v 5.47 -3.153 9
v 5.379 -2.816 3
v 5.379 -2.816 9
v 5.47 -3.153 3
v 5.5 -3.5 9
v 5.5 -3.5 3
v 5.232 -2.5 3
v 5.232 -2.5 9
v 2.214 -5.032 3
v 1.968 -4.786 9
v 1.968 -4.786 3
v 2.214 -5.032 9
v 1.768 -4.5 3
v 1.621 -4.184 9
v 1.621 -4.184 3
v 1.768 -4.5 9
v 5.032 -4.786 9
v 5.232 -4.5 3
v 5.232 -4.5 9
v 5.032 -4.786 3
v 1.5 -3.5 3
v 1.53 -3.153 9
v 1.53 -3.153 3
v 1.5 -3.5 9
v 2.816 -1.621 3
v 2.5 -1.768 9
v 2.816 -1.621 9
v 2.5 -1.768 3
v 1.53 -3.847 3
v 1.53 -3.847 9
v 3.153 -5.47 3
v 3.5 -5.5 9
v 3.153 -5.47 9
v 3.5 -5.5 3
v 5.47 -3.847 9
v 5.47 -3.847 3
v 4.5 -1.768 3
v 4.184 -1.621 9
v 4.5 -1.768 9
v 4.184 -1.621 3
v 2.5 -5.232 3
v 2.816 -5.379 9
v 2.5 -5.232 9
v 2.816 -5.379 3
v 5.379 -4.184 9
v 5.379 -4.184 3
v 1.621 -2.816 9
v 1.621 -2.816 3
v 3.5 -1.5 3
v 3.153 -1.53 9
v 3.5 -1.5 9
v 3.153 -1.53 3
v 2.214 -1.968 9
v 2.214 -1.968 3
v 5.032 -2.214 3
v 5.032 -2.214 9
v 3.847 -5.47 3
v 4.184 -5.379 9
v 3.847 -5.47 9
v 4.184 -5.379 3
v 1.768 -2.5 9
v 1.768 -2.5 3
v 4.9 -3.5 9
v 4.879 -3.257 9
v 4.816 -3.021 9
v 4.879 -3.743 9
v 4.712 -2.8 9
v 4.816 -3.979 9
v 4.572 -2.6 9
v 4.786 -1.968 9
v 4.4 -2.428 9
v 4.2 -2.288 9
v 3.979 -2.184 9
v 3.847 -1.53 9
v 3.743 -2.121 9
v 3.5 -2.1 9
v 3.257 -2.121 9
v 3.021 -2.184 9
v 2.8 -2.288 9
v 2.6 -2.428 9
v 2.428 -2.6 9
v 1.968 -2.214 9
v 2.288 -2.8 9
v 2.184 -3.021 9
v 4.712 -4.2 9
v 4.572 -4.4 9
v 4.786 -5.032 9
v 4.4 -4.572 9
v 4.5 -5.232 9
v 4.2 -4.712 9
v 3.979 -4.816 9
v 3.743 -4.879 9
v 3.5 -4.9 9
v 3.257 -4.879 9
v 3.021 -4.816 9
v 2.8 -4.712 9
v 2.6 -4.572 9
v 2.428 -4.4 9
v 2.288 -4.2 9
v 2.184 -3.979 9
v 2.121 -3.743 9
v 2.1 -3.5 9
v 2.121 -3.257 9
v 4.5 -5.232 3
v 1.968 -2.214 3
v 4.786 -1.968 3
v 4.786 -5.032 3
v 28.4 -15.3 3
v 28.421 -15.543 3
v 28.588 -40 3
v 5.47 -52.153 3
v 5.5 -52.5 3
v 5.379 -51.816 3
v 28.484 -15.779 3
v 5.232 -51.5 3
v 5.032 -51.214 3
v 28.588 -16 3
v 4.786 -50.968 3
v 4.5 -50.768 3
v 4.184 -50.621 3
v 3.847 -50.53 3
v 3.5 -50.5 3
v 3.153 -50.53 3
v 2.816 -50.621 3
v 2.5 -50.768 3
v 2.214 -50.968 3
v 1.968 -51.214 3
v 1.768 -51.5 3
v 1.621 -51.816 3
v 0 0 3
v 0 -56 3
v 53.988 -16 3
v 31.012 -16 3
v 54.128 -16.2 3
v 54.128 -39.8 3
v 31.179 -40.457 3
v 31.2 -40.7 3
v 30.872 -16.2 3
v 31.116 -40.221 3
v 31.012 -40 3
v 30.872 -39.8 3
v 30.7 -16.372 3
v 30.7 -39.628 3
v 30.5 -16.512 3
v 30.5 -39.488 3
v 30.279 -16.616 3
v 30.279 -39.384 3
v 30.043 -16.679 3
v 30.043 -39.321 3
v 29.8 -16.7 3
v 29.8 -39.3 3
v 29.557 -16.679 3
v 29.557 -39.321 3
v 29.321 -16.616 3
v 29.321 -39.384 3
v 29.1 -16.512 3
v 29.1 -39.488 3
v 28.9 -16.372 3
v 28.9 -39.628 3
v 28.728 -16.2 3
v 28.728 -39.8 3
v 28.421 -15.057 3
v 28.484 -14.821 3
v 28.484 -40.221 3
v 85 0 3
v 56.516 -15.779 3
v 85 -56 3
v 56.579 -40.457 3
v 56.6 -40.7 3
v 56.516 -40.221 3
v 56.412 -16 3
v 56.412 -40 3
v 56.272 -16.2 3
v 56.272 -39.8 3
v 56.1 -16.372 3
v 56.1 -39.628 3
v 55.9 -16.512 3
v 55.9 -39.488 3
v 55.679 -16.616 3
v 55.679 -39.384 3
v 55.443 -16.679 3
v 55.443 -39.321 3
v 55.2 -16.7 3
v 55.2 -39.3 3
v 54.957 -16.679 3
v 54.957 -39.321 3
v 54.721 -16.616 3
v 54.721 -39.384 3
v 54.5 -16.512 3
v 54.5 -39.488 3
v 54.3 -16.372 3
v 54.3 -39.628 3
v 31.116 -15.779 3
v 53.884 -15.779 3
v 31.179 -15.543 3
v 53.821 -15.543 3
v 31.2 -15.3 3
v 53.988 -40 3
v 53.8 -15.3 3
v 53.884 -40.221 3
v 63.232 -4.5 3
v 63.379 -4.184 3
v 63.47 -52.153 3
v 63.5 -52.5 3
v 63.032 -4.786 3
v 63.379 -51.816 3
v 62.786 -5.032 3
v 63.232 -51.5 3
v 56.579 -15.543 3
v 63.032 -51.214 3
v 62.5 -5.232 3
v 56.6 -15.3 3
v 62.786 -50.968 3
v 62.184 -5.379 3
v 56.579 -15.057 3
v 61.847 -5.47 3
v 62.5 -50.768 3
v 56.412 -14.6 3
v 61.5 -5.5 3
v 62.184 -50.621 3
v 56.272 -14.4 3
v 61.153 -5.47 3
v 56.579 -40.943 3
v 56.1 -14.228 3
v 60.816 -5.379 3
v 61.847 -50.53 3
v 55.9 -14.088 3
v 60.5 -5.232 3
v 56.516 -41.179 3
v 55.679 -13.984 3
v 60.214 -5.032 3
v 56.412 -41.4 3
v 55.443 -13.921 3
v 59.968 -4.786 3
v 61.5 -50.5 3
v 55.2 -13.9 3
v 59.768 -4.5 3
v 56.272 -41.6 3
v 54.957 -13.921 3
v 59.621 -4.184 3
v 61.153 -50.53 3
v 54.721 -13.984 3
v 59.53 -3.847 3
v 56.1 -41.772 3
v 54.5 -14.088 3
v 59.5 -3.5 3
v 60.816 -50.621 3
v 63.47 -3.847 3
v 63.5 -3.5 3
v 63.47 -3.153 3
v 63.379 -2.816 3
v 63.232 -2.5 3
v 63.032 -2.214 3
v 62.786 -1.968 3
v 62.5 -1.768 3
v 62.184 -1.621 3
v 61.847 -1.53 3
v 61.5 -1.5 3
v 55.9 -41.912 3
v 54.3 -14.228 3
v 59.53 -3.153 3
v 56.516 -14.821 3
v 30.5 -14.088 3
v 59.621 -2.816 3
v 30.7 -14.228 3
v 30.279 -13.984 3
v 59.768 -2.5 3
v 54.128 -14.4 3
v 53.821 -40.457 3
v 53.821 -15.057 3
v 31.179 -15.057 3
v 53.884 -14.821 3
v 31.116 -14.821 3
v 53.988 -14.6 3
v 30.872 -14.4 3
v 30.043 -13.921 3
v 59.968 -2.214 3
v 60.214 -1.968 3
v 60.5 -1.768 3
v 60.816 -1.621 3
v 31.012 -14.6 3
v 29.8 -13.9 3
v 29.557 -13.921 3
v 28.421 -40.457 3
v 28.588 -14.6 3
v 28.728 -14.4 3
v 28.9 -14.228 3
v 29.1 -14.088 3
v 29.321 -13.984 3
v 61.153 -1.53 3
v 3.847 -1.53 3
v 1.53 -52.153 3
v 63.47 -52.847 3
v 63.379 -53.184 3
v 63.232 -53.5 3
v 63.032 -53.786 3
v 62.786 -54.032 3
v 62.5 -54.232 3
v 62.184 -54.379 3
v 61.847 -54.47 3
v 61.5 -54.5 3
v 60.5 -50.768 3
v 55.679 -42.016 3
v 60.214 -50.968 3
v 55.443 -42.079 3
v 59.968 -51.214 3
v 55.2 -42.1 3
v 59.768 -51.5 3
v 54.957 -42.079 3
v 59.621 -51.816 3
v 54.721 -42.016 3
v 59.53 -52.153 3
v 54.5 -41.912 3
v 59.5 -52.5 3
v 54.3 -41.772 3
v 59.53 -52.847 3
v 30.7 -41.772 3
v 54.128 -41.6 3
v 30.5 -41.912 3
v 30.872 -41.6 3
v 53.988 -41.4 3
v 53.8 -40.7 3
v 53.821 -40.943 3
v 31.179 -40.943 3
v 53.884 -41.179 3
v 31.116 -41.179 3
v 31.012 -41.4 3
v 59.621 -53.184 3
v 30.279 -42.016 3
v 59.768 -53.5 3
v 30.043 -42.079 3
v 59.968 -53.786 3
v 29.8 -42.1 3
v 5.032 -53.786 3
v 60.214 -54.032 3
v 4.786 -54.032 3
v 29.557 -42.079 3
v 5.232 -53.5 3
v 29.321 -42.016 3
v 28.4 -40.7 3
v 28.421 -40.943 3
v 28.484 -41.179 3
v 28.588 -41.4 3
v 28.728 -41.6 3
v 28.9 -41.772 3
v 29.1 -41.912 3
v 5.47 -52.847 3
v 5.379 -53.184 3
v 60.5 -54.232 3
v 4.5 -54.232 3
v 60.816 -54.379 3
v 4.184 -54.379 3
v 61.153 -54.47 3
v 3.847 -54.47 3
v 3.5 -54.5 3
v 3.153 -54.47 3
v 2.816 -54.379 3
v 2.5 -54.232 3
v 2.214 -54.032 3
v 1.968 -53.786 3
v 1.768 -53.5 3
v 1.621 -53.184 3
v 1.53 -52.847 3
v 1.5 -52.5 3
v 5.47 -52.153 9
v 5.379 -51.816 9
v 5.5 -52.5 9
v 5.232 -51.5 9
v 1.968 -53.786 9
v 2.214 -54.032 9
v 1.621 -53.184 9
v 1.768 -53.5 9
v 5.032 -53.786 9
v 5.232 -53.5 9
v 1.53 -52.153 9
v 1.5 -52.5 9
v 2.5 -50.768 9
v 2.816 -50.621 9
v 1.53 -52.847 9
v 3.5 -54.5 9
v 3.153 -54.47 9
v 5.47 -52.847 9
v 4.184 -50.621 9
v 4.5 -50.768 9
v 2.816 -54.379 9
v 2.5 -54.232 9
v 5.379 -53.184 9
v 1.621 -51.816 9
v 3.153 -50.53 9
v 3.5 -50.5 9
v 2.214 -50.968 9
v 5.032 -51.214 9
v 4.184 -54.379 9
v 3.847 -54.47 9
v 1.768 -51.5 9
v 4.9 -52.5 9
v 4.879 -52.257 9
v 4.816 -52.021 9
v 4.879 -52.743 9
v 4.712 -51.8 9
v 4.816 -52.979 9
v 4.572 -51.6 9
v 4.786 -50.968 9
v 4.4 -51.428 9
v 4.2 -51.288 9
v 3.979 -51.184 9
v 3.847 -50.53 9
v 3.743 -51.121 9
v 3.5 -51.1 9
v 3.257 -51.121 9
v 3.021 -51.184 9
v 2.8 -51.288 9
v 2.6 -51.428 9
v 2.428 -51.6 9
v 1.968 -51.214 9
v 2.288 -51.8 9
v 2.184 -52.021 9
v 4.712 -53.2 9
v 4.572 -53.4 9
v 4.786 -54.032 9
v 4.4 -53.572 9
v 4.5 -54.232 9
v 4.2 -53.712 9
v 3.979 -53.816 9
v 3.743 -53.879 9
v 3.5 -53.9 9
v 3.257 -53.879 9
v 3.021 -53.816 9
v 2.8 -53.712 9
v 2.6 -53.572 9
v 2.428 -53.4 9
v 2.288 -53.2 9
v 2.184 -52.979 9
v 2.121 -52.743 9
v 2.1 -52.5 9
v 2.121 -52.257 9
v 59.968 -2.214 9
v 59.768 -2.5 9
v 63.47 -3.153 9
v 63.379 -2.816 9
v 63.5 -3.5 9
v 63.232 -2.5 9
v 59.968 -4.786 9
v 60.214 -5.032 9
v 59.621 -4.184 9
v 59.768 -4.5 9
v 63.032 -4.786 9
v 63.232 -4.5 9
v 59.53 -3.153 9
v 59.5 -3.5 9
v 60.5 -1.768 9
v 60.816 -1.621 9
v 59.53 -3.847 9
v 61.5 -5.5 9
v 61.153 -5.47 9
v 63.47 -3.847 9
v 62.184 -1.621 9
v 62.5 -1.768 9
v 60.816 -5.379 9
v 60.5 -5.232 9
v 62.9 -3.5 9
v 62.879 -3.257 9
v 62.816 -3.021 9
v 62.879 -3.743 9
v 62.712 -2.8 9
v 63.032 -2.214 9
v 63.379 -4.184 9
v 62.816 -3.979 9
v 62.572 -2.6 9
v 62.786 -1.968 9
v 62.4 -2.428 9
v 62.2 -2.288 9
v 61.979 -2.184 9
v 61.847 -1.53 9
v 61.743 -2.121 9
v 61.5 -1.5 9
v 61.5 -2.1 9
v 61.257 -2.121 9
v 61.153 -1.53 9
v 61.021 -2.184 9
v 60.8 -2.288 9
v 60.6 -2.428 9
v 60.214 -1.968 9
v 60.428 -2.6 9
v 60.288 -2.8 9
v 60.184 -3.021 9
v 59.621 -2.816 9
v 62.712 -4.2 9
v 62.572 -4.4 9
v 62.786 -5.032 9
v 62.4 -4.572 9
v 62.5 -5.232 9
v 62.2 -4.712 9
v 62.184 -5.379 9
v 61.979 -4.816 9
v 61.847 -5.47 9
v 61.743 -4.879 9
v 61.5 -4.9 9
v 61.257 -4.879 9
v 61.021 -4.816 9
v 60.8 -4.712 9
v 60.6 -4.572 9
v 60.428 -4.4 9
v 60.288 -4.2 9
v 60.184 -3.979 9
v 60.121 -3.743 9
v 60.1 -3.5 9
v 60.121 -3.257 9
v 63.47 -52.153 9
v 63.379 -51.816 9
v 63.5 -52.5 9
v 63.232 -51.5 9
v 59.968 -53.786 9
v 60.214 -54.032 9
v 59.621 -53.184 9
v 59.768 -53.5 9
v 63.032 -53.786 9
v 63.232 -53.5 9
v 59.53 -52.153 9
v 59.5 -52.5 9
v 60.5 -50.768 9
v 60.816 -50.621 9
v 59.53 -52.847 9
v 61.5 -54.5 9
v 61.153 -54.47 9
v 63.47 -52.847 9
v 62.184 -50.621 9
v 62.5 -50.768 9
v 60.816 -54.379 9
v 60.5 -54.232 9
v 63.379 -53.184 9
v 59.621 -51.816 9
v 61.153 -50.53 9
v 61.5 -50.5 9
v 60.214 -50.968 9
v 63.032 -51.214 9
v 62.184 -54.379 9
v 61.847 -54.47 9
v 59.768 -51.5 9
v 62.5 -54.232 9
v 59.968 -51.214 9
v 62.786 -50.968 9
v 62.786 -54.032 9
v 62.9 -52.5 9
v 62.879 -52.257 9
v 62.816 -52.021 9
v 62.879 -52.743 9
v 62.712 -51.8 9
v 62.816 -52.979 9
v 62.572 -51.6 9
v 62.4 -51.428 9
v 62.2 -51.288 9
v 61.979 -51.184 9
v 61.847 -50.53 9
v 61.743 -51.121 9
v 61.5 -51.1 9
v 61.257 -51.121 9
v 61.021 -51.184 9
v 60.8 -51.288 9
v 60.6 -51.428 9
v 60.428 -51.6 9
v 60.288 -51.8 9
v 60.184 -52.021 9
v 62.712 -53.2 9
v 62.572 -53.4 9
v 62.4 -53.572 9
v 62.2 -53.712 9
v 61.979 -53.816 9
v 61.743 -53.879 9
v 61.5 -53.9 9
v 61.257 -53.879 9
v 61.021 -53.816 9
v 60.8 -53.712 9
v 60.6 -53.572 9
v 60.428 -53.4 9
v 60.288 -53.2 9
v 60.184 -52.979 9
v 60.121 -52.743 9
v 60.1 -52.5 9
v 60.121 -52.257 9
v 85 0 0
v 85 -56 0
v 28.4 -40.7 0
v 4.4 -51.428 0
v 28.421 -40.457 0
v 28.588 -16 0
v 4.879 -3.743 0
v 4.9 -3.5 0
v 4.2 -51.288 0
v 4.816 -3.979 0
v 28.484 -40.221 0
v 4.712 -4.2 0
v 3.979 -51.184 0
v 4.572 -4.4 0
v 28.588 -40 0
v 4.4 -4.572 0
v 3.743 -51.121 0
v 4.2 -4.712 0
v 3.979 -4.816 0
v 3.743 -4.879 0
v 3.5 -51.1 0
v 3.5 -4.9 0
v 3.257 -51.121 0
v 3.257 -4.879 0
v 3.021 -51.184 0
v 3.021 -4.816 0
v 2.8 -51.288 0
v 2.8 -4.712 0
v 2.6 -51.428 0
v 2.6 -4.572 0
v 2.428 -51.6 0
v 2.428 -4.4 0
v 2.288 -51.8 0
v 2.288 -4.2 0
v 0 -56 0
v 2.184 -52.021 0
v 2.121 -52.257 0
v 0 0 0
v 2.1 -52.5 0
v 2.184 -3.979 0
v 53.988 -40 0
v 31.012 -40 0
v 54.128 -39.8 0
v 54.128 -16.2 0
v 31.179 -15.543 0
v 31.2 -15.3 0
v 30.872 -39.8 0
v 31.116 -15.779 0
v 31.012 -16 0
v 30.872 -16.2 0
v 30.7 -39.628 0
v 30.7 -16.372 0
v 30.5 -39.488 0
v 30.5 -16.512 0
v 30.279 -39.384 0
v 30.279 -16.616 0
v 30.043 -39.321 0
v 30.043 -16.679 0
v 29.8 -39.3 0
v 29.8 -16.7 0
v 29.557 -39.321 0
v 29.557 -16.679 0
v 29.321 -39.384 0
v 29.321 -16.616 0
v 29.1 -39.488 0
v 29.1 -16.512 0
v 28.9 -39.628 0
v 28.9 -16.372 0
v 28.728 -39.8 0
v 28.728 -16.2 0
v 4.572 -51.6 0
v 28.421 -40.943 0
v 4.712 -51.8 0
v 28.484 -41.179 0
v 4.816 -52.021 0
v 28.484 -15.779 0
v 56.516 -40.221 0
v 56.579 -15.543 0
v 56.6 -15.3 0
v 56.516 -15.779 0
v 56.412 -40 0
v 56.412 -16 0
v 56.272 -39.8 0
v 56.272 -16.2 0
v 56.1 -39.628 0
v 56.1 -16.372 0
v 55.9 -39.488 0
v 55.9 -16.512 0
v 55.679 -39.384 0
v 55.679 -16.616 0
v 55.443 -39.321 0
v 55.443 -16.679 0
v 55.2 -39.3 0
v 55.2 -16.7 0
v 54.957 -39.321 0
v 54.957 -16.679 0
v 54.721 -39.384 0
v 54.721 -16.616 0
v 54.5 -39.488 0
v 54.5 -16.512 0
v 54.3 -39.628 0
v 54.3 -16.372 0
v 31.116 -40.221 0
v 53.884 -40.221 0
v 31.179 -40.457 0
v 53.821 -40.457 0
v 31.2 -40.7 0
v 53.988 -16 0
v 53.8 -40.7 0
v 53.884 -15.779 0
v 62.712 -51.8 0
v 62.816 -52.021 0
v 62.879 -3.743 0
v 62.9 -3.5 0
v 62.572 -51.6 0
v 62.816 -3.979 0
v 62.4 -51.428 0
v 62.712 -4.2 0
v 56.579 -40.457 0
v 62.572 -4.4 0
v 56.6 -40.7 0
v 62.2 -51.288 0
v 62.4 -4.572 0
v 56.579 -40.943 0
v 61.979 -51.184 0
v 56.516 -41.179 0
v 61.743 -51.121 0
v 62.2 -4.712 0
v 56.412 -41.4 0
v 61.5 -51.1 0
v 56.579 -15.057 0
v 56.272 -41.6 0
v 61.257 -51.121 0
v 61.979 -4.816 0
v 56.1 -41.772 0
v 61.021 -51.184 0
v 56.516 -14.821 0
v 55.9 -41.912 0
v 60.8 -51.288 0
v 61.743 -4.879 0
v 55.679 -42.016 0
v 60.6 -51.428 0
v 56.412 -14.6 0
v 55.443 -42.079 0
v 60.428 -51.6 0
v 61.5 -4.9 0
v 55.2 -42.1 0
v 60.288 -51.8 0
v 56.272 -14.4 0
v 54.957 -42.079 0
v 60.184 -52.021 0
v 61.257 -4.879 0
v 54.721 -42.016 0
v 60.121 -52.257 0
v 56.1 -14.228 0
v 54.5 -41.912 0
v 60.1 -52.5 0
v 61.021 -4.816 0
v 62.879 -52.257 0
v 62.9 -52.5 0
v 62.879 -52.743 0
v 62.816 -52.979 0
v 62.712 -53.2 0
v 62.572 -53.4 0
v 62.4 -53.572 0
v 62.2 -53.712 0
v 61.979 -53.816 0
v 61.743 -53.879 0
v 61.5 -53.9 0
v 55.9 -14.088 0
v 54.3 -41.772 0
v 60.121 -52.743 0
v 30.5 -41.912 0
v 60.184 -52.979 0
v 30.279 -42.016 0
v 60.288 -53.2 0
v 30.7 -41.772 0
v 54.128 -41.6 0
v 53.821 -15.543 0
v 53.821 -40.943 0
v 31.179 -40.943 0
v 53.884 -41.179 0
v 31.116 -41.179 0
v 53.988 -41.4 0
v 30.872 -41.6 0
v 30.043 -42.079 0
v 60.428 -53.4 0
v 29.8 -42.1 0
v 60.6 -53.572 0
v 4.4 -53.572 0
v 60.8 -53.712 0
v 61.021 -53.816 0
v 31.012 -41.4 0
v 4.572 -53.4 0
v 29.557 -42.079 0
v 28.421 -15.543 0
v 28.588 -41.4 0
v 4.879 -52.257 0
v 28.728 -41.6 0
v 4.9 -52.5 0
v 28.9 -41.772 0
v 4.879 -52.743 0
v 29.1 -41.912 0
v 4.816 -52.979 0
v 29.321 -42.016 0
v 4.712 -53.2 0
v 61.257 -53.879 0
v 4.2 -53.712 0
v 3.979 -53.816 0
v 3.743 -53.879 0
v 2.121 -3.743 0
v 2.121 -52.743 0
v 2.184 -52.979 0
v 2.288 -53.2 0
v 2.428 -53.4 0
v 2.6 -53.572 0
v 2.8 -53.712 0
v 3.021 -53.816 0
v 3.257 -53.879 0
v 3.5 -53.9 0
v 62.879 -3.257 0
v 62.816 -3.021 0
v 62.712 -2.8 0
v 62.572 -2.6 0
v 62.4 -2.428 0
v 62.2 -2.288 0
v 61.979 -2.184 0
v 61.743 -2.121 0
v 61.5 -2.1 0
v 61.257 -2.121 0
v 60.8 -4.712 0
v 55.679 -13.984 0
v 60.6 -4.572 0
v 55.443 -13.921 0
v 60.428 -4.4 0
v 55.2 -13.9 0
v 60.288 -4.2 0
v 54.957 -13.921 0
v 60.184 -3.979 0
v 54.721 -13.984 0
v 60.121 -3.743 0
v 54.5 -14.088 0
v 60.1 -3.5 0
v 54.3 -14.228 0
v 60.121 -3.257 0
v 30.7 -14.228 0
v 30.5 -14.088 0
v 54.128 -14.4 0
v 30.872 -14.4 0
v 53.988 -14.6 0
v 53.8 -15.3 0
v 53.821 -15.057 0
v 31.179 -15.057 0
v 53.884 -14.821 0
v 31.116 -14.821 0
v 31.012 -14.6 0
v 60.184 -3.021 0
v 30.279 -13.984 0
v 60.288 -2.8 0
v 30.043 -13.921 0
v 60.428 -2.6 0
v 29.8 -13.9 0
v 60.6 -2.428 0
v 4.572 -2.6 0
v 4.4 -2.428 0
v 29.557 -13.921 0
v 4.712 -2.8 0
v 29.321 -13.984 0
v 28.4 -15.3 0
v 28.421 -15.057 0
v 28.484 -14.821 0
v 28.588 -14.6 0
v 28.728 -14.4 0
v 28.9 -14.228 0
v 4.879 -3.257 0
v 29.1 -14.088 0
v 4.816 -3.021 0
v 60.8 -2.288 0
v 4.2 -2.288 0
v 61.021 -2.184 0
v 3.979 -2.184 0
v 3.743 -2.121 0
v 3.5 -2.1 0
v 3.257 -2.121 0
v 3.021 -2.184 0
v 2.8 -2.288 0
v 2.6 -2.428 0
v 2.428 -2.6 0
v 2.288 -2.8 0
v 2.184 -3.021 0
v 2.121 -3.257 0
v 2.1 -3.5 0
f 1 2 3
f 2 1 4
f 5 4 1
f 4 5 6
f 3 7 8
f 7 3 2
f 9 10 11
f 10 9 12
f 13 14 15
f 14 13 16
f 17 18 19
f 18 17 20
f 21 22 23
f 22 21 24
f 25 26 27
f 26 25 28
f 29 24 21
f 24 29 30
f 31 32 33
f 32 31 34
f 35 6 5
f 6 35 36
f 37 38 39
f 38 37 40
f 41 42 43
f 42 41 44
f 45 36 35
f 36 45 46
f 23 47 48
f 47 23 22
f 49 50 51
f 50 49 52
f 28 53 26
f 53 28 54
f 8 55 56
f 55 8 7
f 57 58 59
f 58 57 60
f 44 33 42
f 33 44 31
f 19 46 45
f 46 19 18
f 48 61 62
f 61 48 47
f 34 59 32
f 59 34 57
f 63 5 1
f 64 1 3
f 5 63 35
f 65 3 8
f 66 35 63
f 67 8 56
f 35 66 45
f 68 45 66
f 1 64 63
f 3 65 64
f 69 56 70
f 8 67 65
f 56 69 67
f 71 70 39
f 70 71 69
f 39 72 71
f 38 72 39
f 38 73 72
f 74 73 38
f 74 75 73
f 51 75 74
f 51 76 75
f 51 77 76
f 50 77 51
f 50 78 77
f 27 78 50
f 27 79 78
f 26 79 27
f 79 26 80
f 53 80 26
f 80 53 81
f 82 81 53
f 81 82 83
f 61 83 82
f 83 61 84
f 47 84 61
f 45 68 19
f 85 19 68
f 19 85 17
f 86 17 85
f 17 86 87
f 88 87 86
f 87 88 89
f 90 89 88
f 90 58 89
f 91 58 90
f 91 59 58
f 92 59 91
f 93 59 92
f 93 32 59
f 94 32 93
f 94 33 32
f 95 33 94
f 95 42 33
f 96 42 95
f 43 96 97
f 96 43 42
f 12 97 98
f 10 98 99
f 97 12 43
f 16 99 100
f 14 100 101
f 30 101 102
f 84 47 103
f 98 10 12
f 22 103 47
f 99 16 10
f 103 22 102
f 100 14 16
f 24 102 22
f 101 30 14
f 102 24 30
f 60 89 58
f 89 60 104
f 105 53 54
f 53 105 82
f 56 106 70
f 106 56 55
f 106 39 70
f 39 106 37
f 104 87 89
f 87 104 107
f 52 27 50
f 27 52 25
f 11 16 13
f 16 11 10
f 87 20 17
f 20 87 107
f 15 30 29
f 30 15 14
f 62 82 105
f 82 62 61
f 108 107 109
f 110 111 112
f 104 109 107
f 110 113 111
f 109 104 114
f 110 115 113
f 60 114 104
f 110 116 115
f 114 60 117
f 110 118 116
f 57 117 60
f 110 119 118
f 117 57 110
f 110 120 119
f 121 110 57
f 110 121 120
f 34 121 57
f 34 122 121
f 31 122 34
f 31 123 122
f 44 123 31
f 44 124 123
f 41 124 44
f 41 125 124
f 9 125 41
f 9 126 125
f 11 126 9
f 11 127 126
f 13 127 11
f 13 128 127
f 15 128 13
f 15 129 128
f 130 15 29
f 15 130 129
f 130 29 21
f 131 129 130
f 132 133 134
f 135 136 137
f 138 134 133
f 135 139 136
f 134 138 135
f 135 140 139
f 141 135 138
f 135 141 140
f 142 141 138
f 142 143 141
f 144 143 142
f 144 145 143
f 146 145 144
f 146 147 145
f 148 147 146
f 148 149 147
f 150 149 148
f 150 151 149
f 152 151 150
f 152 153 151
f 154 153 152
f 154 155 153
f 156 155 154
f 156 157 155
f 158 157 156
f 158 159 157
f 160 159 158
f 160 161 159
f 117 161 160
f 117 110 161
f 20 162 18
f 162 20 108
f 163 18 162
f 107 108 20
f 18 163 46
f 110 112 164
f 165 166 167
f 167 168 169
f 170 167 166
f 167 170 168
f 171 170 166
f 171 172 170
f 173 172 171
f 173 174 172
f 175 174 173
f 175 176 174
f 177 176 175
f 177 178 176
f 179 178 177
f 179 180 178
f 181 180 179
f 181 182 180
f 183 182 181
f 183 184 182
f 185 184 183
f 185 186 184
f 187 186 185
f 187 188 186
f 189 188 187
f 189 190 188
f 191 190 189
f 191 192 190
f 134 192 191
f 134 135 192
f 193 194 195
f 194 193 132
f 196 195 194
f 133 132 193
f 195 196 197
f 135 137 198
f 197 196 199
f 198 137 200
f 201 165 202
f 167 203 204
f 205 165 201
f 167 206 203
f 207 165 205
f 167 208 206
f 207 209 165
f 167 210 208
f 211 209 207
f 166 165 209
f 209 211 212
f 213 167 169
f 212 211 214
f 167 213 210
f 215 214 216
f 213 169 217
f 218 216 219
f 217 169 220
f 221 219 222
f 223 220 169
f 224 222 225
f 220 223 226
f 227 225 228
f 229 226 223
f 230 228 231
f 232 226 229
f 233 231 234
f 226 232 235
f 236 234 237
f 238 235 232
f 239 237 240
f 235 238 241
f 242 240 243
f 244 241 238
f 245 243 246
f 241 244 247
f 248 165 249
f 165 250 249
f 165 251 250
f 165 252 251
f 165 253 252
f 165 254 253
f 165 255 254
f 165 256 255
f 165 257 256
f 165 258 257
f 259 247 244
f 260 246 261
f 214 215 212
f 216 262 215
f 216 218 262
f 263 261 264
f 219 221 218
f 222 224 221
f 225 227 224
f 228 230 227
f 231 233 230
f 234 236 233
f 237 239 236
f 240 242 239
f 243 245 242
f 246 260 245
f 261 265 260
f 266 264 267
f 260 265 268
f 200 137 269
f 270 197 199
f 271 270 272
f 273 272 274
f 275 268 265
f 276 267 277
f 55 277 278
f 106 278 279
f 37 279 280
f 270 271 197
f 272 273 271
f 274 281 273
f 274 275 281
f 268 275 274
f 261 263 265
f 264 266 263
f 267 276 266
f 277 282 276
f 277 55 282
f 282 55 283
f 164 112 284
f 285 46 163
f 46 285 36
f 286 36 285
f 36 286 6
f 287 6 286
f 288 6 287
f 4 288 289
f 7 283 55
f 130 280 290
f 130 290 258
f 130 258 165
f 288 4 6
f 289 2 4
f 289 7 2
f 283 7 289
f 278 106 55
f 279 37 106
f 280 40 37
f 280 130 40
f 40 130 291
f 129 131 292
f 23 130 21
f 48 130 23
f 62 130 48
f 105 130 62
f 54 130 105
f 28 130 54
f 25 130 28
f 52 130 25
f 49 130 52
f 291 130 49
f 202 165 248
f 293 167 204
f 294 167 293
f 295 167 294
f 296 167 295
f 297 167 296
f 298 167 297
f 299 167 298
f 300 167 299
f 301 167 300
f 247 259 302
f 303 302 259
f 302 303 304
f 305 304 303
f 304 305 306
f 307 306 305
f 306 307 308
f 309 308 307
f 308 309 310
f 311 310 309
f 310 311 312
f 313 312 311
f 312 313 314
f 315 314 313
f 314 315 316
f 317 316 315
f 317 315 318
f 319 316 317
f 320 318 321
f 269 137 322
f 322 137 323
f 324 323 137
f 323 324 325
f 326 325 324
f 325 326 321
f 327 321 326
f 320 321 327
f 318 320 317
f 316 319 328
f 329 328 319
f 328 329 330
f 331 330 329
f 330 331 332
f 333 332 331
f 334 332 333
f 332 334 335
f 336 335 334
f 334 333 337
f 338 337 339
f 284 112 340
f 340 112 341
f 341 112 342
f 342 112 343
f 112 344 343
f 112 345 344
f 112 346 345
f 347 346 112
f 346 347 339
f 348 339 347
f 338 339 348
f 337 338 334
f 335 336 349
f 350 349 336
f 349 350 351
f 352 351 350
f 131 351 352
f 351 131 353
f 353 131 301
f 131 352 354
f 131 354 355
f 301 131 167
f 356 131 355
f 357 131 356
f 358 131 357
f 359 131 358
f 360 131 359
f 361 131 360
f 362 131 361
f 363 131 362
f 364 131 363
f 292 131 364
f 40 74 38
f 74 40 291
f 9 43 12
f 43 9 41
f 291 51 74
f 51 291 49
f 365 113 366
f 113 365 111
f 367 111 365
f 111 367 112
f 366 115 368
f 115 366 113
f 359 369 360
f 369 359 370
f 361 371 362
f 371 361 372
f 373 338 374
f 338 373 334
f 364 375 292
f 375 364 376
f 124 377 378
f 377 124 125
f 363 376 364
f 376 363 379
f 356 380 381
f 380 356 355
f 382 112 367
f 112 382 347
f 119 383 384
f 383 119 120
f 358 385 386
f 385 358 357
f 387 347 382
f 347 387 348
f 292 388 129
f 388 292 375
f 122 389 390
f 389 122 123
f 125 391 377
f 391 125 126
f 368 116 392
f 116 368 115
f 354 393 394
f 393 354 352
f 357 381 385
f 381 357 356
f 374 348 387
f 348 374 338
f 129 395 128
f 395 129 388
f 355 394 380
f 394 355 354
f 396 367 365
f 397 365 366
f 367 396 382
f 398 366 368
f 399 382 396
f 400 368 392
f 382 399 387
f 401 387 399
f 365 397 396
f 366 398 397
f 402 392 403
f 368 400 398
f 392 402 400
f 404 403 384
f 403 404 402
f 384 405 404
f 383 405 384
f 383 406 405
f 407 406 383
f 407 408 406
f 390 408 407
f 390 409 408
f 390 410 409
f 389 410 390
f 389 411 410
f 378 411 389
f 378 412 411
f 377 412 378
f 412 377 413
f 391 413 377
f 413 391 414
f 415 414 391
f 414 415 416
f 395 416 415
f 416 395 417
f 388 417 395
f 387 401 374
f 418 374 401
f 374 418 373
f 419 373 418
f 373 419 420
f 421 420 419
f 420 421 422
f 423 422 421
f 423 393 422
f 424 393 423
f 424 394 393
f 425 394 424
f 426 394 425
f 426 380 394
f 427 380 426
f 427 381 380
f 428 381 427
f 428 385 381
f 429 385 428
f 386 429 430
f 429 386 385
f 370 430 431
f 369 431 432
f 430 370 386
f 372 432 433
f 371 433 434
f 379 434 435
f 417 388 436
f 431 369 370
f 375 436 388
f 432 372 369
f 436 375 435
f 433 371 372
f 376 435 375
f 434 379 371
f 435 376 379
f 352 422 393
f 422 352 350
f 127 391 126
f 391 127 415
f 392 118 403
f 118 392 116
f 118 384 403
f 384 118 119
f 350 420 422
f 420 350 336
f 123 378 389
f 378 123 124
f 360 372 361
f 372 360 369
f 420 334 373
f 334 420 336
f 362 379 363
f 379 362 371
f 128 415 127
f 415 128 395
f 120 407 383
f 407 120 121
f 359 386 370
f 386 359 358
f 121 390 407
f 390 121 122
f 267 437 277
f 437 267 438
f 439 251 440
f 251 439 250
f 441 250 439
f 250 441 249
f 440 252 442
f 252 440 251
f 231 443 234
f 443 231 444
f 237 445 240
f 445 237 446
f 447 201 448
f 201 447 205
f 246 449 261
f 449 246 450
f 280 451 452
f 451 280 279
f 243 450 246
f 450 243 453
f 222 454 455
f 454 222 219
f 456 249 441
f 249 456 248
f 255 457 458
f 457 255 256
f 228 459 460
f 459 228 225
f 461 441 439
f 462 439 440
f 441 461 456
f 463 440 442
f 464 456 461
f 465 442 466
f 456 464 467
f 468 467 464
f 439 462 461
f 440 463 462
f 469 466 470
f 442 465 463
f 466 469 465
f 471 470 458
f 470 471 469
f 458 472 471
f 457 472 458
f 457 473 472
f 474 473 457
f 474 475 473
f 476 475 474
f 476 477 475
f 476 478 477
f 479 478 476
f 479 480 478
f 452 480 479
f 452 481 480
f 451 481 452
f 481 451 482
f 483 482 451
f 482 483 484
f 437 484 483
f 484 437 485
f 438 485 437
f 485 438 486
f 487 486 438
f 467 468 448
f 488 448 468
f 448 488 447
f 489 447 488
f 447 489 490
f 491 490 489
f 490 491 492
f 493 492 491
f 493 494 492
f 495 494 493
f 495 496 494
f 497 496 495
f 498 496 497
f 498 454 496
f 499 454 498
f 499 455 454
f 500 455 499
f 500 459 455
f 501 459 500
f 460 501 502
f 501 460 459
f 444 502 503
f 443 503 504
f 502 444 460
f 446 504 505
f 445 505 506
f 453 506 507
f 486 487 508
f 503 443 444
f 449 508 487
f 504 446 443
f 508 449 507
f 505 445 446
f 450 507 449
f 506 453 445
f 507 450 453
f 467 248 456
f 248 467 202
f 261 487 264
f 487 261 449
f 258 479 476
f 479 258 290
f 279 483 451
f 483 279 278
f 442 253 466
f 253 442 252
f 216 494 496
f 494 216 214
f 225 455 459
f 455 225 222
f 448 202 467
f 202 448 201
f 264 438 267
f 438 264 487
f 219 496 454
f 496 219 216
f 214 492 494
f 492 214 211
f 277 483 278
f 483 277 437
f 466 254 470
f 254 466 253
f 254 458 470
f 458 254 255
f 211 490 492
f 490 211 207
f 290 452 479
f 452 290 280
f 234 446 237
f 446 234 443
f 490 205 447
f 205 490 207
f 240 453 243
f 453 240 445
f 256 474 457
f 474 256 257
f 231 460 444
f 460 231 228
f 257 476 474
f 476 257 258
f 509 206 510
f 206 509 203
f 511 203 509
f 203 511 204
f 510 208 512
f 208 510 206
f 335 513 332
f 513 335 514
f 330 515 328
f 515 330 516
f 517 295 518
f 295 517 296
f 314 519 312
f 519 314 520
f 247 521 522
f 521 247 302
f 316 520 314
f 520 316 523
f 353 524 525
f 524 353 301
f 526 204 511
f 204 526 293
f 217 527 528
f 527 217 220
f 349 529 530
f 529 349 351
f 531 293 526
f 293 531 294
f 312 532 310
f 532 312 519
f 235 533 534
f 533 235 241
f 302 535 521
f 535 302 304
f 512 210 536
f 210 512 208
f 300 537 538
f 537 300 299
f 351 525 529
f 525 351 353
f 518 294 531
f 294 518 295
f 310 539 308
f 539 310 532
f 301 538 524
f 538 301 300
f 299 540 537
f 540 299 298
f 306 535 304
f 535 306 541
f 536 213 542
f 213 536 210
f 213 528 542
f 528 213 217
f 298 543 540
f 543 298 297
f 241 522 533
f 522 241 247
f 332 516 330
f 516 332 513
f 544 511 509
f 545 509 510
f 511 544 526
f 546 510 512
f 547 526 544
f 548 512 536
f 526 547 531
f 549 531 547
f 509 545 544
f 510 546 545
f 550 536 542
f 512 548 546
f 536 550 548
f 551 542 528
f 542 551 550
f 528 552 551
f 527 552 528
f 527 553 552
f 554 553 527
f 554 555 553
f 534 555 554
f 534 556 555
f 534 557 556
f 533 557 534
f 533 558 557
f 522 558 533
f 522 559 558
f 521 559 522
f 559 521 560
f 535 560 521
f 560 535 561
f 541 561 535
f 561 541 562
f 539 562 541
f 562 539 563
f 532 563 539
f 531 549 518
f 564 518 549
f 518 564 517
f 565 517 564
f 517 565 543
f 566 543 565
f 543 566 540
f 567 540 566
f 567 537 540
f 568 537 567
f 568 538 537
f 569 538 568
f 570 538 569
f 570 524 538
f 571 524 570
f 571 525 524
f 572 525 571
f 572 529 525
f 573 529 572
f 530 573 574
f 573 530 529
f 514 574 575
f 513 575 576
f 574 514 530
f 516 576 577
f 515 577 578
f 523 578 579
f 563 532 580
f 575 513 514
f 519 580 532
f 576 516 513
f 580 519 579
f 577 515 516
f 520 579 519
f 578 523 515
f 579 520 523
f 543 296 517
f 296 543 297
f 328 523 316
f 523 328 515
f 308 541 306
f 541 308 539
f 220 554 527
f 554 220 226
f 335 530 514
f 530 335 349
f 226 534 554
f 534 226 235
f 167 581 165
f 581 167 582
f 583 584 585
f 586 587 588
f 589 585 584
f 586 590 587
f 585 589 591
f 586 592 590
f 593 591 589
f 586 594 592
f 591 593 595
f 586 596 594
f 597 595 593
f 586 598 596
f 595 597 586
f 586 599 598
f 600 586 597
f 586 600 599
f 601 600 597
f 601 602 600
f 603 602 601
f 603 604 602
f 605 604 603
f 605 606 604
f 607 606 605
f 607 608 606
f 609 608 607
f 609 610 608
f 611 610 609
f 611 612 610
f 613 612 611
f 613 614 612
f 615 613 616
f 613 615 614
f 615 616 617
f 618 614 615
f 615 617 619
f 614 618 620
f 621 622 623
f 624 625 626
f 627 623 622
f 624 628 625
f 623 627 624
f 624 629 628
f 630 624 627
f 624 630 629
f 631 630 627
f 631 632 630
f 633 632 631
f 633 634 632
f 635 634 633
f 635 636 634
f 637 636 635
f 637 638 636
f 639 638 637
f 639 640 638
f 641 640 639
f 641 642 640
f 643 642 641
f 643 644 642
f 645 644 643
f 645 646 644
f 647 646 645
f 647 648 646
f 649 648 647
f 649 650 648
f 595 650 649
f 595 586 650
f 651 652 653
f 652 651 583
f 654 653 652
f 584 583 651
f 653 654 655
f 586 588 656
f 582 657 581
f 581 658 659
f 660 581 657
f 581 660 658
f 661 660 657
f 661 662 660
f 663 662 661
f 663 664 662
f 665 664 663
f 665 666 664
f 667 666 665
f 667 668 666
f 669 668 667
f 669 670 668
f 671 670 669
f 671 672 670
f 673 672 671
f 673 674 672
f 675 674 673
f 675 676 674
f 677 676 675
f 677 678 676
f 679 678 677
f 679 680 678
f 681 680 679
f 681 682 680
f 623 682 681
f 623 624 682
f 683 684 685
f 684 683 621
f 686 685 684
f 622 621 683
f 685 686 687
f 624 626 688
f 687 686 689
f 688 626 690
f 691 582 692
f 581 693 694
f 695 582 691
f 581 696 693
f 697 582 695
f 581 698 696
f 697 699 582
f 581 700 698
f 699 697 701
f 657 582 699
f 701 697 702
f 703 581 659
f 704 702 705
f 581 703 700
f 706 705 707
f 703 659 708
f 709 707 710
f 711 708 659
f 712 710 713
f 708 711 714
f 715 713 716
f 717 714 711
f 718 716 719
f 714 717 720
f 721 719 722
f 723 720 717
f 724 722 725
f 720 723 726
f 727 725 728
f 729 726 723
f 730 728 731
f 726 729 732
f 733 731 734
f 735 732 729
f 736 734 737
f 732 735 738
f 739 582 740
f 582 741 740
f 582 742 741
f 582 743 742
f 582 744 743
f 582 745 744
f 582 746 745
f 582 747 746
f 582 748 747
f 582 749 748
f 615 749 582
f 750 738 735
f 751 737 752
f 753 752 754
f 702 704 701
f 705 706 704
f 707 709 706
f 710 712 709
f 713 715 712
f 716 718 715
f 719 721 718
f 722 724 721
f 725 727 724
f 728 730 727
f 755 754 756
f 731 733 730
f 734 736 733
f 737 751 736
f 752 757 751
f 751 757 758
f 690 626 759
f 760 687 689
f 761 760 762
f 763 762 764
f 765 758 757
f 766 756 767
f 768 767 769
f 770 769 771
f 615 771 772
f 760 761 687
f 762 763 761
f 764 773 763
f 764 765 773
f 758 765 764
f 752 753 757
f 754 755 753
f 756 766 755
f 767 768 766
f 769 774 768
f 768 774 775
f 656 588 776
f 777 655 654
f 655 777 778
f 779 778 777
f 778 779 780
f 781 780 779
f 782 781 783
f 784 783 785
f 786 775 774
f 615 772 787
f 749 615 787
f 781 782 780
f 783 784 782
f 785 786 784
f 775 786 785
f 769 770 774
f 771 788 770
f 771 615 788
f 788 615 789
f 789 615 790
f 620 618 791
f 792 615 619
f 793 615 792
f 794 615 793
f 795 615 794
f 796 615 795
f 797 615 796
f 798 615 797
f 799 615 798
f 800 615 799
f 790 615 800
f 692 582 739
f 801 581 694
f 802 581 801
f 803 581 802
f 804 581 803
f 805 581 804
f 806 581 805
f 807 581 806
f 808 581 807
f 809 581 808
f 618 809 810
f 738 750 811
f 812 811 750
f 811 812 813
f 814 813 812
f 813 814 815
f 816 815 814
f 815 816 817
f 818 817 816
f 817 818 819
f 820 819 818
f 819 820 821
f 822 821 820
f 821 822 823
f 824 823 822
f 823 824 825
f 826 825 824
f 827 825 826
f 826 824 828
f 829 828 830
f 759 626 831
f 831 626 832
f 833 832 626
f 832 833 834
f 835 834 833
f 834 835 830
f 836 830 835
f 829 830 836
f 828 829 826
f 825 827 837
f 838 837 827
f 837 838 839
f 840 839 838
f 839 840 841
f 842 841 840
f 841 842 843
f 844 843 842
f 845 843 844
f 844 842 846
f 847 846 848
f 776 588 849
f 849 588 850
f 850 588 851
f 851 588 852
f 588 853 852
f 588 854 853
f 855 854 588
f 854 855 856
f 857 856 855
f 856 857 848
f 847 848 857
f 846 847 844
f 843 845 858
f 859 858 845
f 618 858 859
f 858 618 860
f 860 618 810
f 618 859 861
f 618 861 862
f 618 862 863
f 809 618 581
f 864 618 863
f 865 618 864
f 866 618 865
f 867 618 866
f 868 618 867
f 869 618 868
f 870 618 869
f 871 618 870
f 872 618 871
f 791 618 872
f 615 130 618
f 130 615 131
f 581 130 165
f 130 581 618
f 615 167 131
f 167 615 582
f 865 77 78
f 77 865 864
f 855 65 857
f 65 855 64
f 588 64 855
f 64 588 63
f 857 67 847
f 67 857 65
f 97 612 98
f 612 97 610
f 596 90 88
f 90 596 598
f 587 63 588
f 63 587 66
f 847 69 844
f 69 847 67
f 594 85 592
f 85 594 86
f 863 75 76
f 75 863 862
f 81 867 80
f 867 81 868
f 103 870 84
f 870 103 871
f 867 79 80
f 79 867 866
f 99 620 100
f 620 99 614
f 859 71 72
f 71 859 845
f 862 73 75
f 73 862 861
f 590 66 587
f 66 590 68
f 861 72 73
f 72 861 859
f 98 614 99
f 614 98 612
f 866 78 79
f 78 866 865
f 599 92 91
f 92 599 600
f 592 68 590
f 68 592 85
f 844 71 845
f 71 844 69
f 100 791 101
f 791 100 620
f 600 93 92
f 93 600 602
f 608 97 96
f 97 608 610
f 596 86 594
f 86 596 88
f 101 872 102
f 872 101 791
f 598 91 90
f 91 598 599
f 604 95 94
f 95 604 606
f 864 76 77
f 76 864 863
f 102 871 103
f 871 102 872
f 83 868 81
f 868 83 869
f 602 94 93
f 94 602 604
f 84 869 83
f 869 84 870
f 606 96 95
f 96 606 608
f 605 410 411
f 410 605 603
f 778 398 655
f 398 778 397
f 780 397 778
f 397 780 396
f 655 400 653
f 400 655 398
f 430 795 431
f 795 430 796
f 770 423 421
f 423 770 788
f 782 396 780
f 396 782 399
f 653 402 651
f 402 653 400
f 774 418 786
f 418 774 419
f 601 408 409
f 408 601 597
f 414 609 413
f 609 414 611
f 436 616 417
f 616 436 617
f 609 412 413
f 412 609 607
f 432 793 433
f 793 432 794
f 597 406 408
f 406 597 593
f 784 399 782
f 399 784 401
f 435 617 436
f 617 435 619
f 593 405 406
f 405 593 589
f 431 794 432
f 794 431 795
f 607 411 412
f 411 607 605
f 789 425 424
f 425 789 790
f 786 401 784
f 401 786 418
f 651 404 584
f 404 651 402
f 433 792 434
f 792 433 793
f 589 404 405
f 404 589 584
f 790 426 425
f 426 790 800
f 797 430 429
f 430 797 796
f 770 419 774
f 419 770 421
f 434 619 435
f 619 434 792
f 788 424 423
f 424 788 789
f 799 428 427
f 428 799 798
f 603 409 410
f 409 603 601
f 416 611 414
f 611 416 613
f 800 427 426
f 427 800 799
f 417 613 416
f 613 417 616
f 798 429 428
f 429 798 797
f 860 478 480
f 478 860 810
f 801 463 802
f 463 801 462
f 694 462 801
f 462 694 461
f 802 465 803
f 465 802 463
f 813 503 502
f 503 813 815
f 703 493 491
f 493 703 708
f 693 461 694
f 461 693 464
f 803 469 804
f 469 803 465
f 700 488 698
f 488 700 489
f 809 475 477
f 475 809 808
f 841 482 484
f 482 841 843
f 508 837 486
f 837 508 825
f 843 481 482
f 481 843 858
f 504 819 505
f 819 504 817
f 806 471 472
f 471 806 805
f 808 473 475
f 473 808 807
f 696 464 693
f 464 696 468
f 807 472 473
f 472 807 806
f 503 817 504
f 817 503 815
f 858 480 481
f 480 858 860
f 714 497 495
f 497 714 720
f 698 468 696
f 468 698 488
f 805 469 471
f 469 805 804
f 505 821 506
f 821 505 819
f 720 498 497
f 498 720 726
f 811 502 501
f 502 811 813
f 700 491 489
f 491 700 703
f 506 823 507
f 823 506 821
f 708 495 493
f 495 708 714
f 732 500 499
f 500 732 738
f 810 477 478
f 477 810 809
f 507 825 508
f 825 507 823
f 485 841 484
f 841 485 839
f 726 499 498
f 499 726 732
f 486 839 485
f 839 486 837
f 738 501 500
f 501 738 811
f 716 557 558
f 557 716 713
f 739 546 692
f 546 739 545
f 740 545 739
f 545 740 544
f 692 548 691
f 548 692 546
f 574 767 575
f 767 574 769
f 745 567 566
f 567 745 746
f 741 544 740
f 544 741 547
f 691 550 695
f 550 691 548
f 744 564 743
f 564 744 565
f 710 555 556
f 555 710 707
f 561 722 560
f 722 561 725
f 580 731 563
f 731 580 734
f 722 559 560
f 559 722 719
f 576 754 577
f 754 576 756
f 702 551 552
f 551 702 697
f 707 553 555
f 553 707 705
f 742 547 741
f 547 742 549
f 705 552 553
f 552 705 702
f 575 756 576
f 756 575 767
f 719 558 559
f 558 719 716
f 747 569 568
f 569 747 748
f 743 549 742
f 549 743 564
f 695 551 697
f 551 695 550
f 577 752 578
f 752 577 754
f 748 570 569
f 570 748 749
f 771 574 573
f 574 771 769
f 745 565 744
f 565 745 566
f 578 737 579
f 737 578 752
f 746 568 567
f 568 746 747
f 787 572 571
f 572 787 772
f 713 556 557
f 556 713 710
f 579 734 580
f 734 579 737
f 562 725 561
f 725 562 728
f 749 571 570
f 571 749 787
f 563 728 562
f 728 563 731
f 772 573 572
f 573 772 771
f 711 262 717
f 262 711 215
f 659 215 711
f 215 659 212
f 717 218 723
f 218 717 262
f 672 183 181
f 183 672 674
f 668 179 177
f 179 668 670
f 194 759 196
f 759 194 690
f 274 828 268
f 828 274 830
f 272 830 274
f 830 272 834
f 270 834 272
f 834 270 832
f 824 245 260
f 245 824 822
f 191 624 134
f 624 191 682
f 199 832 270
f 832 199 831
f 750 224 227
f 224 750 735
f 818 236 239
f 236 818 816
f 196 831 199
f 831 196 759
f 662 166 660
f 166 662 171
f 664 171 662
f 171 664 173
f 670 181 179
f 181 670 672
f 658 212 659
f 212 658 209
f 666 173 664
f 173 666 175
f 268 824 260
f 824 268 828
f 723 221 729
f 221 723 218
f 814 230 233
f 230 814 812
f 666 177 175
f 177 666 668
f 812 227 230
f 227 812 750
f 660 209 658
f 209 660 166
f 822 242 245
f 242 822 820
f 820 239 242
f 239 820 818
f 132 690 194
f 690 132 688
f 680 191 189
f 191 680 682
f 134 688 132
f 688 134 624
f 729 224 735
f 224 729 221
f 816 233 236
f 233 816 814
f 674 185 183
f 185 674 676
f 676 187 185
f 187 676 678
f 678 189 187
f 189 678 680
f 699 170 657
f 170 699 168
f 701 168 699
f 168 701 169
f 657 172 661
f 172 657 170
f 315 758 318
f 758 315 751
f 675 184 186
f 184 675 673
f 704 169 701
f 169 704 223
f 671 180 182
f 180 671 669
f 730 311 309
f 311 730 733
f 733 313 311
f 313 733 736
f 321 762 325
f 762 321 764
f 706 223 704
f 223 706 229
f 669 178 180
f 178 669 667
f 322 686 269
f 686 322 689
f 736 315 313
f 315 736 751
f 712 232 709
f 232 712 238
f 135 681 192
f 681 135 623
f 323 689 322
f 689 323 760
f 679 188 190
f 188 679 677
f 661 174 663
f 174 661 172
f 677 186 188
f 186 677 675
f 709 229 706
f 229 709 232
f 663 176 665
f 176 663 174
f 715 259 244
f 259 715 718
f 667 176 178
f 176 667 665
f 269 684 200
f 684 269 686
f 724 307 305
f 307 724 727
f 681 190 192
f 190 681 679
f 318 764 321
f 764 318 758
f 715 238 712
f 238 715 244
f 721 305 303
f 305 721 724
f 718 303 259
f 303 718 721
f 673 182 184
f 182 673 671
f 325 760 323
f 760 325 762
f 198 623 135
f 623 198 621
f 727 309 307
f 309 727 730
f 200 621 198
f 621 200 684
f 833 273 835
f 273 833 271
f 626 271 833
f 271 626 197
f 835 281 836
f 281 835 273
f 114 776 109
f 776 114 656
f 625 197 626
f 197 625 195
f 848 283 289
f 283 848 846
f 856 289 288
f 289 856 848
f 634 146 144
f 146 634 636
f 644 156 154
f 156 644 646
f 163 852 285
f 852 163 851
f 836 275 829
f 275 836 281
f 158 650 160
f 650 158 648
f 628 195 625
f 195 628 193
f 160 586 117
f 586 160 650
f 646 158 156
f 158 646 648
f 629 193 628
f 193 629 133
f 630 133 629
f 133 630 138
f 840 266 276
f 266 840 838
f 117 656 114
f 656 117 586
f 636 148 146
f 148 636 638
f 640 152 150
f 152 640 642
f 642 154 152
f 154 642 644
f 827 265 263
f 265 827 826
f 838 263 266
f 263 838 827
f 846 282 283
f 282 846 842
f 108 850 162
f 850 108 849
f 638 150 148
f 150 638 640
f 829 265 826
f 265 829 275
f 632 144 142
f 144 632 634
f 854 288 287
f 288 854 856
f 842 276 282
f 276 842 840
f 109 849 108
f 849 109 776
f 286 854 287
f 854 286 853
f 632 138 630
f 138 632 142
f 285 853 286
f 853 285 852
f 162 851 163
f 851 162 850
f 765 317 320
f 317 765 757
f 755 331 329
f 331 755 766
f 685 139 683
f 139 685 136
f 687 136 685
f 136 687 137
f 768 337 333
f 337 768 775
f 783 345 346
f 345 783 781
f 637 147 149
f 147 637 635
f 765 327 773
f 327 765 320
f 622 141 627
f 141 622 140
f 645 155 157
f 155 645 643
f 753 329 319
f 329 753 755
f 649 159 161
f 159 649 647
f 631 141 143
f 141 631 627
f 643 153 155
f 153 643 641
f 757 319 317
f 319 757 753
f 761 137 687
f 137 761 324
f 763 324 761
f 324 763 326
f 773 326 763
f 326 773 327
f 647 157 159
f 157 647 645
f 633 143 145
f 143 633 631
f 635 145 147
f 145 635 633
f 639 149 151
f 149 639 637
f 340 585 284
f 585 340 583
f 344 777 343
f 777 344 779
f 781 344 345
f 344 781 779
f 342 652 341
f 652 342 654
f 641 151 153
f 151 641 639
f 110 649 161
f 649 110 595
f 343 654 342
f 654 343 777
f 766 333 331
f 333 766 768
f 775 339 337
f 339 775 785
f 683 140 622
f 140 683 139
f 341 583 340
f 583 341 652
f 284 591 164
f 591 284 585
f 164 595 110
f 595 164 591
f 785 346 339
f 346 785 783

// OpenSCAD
//
// Raspberry Pi ４B
//
// RaspberryPi4B-1-20251123A.scad
//
// https://www.raspberrypi.com/documentation/computers/raspberry-pi.html
//
// Last update: 2025-11-23(Sun) 00:10 JST / 2025-11-22(Sat) 15:10 UTC
//

Px = 85.0; Py = -56.0; Pz = 3.0;    // パネルの 横・縦・厚さ （P は "Panel" の P）
Cd = 4.0;  Cz = 6.0;                // 円柱の直径、厚さ （Cは "Cylinder" の C）
H1d = 2.8; H2d = 2.8;               // 穴1（円柱）, 穴2(DIN) の直径 （H は "Hole" の H）

// 穴1の位置リスト
hole1_pos = [
    [ 3.5,   -3.5 ],
    [ 3.5,  -52.5 ],
    [ 61.5,  -3.5 ],
    [ 61.5, -52.5 ]
];

// 穴2の位置リスト
hole2_pos = [
  [ Px/2 + 12.7, Py/2 + 12.7 ],
  [ Px/2 + 12.7, Py/2 - 12.7 ],
  [ Px/2 - 12.7, Py/2 + 12.7 ],
  [ Px/2 - 12.7, Py/2 - 12.7 ],
];

difference() {
    // (1) まず、4本の円柱を持つ直方体のパネルを作る
    union() {
        // パネルを用意
        // cube([Px, -Py, Pz]); // 第1章限で造形する場合
        translate([0, Py, 0]) cube([Px, -Py, Pz]);  // 第4象限で造形する場合
        // 円柱を4本立てる
        for (pos = hole1_pos) {
            x = pos[0]; y = pos[1];
            translate([x, y, Pz]) cylinder(h = Cz, d = Cd, $fn = 36);
        }
    }
    // (2) 次に、それぞれの円柱に穴1を貫通させる
    for (pos = hole1_pos) {
        x = pos[0]; y = pos[1];
        translate([x, y, -1.0]) cylinder(h = Pz + Cz + 2.0, d = H1d, $fn = 36);
        // 確実に穴をあけるため、パネル厚+円柱厚より2mm長い円柱をパネル底面より1mm沈めて配置
    }
    // (3) 最後に、パネルに穴2を貫通させる
    for (pos = hole2_pos) {
        x = pos[0]; y = pos[1];
        translate([x, y, -1.0]) cylinder(h = Pz + 2.0, d = H2d, $fn = 36);
        // 確実に穴をあけるため、パネル厚+円柱厚より2mm長い円柱をパネル底面より1mm沈めて配置
    }
}
